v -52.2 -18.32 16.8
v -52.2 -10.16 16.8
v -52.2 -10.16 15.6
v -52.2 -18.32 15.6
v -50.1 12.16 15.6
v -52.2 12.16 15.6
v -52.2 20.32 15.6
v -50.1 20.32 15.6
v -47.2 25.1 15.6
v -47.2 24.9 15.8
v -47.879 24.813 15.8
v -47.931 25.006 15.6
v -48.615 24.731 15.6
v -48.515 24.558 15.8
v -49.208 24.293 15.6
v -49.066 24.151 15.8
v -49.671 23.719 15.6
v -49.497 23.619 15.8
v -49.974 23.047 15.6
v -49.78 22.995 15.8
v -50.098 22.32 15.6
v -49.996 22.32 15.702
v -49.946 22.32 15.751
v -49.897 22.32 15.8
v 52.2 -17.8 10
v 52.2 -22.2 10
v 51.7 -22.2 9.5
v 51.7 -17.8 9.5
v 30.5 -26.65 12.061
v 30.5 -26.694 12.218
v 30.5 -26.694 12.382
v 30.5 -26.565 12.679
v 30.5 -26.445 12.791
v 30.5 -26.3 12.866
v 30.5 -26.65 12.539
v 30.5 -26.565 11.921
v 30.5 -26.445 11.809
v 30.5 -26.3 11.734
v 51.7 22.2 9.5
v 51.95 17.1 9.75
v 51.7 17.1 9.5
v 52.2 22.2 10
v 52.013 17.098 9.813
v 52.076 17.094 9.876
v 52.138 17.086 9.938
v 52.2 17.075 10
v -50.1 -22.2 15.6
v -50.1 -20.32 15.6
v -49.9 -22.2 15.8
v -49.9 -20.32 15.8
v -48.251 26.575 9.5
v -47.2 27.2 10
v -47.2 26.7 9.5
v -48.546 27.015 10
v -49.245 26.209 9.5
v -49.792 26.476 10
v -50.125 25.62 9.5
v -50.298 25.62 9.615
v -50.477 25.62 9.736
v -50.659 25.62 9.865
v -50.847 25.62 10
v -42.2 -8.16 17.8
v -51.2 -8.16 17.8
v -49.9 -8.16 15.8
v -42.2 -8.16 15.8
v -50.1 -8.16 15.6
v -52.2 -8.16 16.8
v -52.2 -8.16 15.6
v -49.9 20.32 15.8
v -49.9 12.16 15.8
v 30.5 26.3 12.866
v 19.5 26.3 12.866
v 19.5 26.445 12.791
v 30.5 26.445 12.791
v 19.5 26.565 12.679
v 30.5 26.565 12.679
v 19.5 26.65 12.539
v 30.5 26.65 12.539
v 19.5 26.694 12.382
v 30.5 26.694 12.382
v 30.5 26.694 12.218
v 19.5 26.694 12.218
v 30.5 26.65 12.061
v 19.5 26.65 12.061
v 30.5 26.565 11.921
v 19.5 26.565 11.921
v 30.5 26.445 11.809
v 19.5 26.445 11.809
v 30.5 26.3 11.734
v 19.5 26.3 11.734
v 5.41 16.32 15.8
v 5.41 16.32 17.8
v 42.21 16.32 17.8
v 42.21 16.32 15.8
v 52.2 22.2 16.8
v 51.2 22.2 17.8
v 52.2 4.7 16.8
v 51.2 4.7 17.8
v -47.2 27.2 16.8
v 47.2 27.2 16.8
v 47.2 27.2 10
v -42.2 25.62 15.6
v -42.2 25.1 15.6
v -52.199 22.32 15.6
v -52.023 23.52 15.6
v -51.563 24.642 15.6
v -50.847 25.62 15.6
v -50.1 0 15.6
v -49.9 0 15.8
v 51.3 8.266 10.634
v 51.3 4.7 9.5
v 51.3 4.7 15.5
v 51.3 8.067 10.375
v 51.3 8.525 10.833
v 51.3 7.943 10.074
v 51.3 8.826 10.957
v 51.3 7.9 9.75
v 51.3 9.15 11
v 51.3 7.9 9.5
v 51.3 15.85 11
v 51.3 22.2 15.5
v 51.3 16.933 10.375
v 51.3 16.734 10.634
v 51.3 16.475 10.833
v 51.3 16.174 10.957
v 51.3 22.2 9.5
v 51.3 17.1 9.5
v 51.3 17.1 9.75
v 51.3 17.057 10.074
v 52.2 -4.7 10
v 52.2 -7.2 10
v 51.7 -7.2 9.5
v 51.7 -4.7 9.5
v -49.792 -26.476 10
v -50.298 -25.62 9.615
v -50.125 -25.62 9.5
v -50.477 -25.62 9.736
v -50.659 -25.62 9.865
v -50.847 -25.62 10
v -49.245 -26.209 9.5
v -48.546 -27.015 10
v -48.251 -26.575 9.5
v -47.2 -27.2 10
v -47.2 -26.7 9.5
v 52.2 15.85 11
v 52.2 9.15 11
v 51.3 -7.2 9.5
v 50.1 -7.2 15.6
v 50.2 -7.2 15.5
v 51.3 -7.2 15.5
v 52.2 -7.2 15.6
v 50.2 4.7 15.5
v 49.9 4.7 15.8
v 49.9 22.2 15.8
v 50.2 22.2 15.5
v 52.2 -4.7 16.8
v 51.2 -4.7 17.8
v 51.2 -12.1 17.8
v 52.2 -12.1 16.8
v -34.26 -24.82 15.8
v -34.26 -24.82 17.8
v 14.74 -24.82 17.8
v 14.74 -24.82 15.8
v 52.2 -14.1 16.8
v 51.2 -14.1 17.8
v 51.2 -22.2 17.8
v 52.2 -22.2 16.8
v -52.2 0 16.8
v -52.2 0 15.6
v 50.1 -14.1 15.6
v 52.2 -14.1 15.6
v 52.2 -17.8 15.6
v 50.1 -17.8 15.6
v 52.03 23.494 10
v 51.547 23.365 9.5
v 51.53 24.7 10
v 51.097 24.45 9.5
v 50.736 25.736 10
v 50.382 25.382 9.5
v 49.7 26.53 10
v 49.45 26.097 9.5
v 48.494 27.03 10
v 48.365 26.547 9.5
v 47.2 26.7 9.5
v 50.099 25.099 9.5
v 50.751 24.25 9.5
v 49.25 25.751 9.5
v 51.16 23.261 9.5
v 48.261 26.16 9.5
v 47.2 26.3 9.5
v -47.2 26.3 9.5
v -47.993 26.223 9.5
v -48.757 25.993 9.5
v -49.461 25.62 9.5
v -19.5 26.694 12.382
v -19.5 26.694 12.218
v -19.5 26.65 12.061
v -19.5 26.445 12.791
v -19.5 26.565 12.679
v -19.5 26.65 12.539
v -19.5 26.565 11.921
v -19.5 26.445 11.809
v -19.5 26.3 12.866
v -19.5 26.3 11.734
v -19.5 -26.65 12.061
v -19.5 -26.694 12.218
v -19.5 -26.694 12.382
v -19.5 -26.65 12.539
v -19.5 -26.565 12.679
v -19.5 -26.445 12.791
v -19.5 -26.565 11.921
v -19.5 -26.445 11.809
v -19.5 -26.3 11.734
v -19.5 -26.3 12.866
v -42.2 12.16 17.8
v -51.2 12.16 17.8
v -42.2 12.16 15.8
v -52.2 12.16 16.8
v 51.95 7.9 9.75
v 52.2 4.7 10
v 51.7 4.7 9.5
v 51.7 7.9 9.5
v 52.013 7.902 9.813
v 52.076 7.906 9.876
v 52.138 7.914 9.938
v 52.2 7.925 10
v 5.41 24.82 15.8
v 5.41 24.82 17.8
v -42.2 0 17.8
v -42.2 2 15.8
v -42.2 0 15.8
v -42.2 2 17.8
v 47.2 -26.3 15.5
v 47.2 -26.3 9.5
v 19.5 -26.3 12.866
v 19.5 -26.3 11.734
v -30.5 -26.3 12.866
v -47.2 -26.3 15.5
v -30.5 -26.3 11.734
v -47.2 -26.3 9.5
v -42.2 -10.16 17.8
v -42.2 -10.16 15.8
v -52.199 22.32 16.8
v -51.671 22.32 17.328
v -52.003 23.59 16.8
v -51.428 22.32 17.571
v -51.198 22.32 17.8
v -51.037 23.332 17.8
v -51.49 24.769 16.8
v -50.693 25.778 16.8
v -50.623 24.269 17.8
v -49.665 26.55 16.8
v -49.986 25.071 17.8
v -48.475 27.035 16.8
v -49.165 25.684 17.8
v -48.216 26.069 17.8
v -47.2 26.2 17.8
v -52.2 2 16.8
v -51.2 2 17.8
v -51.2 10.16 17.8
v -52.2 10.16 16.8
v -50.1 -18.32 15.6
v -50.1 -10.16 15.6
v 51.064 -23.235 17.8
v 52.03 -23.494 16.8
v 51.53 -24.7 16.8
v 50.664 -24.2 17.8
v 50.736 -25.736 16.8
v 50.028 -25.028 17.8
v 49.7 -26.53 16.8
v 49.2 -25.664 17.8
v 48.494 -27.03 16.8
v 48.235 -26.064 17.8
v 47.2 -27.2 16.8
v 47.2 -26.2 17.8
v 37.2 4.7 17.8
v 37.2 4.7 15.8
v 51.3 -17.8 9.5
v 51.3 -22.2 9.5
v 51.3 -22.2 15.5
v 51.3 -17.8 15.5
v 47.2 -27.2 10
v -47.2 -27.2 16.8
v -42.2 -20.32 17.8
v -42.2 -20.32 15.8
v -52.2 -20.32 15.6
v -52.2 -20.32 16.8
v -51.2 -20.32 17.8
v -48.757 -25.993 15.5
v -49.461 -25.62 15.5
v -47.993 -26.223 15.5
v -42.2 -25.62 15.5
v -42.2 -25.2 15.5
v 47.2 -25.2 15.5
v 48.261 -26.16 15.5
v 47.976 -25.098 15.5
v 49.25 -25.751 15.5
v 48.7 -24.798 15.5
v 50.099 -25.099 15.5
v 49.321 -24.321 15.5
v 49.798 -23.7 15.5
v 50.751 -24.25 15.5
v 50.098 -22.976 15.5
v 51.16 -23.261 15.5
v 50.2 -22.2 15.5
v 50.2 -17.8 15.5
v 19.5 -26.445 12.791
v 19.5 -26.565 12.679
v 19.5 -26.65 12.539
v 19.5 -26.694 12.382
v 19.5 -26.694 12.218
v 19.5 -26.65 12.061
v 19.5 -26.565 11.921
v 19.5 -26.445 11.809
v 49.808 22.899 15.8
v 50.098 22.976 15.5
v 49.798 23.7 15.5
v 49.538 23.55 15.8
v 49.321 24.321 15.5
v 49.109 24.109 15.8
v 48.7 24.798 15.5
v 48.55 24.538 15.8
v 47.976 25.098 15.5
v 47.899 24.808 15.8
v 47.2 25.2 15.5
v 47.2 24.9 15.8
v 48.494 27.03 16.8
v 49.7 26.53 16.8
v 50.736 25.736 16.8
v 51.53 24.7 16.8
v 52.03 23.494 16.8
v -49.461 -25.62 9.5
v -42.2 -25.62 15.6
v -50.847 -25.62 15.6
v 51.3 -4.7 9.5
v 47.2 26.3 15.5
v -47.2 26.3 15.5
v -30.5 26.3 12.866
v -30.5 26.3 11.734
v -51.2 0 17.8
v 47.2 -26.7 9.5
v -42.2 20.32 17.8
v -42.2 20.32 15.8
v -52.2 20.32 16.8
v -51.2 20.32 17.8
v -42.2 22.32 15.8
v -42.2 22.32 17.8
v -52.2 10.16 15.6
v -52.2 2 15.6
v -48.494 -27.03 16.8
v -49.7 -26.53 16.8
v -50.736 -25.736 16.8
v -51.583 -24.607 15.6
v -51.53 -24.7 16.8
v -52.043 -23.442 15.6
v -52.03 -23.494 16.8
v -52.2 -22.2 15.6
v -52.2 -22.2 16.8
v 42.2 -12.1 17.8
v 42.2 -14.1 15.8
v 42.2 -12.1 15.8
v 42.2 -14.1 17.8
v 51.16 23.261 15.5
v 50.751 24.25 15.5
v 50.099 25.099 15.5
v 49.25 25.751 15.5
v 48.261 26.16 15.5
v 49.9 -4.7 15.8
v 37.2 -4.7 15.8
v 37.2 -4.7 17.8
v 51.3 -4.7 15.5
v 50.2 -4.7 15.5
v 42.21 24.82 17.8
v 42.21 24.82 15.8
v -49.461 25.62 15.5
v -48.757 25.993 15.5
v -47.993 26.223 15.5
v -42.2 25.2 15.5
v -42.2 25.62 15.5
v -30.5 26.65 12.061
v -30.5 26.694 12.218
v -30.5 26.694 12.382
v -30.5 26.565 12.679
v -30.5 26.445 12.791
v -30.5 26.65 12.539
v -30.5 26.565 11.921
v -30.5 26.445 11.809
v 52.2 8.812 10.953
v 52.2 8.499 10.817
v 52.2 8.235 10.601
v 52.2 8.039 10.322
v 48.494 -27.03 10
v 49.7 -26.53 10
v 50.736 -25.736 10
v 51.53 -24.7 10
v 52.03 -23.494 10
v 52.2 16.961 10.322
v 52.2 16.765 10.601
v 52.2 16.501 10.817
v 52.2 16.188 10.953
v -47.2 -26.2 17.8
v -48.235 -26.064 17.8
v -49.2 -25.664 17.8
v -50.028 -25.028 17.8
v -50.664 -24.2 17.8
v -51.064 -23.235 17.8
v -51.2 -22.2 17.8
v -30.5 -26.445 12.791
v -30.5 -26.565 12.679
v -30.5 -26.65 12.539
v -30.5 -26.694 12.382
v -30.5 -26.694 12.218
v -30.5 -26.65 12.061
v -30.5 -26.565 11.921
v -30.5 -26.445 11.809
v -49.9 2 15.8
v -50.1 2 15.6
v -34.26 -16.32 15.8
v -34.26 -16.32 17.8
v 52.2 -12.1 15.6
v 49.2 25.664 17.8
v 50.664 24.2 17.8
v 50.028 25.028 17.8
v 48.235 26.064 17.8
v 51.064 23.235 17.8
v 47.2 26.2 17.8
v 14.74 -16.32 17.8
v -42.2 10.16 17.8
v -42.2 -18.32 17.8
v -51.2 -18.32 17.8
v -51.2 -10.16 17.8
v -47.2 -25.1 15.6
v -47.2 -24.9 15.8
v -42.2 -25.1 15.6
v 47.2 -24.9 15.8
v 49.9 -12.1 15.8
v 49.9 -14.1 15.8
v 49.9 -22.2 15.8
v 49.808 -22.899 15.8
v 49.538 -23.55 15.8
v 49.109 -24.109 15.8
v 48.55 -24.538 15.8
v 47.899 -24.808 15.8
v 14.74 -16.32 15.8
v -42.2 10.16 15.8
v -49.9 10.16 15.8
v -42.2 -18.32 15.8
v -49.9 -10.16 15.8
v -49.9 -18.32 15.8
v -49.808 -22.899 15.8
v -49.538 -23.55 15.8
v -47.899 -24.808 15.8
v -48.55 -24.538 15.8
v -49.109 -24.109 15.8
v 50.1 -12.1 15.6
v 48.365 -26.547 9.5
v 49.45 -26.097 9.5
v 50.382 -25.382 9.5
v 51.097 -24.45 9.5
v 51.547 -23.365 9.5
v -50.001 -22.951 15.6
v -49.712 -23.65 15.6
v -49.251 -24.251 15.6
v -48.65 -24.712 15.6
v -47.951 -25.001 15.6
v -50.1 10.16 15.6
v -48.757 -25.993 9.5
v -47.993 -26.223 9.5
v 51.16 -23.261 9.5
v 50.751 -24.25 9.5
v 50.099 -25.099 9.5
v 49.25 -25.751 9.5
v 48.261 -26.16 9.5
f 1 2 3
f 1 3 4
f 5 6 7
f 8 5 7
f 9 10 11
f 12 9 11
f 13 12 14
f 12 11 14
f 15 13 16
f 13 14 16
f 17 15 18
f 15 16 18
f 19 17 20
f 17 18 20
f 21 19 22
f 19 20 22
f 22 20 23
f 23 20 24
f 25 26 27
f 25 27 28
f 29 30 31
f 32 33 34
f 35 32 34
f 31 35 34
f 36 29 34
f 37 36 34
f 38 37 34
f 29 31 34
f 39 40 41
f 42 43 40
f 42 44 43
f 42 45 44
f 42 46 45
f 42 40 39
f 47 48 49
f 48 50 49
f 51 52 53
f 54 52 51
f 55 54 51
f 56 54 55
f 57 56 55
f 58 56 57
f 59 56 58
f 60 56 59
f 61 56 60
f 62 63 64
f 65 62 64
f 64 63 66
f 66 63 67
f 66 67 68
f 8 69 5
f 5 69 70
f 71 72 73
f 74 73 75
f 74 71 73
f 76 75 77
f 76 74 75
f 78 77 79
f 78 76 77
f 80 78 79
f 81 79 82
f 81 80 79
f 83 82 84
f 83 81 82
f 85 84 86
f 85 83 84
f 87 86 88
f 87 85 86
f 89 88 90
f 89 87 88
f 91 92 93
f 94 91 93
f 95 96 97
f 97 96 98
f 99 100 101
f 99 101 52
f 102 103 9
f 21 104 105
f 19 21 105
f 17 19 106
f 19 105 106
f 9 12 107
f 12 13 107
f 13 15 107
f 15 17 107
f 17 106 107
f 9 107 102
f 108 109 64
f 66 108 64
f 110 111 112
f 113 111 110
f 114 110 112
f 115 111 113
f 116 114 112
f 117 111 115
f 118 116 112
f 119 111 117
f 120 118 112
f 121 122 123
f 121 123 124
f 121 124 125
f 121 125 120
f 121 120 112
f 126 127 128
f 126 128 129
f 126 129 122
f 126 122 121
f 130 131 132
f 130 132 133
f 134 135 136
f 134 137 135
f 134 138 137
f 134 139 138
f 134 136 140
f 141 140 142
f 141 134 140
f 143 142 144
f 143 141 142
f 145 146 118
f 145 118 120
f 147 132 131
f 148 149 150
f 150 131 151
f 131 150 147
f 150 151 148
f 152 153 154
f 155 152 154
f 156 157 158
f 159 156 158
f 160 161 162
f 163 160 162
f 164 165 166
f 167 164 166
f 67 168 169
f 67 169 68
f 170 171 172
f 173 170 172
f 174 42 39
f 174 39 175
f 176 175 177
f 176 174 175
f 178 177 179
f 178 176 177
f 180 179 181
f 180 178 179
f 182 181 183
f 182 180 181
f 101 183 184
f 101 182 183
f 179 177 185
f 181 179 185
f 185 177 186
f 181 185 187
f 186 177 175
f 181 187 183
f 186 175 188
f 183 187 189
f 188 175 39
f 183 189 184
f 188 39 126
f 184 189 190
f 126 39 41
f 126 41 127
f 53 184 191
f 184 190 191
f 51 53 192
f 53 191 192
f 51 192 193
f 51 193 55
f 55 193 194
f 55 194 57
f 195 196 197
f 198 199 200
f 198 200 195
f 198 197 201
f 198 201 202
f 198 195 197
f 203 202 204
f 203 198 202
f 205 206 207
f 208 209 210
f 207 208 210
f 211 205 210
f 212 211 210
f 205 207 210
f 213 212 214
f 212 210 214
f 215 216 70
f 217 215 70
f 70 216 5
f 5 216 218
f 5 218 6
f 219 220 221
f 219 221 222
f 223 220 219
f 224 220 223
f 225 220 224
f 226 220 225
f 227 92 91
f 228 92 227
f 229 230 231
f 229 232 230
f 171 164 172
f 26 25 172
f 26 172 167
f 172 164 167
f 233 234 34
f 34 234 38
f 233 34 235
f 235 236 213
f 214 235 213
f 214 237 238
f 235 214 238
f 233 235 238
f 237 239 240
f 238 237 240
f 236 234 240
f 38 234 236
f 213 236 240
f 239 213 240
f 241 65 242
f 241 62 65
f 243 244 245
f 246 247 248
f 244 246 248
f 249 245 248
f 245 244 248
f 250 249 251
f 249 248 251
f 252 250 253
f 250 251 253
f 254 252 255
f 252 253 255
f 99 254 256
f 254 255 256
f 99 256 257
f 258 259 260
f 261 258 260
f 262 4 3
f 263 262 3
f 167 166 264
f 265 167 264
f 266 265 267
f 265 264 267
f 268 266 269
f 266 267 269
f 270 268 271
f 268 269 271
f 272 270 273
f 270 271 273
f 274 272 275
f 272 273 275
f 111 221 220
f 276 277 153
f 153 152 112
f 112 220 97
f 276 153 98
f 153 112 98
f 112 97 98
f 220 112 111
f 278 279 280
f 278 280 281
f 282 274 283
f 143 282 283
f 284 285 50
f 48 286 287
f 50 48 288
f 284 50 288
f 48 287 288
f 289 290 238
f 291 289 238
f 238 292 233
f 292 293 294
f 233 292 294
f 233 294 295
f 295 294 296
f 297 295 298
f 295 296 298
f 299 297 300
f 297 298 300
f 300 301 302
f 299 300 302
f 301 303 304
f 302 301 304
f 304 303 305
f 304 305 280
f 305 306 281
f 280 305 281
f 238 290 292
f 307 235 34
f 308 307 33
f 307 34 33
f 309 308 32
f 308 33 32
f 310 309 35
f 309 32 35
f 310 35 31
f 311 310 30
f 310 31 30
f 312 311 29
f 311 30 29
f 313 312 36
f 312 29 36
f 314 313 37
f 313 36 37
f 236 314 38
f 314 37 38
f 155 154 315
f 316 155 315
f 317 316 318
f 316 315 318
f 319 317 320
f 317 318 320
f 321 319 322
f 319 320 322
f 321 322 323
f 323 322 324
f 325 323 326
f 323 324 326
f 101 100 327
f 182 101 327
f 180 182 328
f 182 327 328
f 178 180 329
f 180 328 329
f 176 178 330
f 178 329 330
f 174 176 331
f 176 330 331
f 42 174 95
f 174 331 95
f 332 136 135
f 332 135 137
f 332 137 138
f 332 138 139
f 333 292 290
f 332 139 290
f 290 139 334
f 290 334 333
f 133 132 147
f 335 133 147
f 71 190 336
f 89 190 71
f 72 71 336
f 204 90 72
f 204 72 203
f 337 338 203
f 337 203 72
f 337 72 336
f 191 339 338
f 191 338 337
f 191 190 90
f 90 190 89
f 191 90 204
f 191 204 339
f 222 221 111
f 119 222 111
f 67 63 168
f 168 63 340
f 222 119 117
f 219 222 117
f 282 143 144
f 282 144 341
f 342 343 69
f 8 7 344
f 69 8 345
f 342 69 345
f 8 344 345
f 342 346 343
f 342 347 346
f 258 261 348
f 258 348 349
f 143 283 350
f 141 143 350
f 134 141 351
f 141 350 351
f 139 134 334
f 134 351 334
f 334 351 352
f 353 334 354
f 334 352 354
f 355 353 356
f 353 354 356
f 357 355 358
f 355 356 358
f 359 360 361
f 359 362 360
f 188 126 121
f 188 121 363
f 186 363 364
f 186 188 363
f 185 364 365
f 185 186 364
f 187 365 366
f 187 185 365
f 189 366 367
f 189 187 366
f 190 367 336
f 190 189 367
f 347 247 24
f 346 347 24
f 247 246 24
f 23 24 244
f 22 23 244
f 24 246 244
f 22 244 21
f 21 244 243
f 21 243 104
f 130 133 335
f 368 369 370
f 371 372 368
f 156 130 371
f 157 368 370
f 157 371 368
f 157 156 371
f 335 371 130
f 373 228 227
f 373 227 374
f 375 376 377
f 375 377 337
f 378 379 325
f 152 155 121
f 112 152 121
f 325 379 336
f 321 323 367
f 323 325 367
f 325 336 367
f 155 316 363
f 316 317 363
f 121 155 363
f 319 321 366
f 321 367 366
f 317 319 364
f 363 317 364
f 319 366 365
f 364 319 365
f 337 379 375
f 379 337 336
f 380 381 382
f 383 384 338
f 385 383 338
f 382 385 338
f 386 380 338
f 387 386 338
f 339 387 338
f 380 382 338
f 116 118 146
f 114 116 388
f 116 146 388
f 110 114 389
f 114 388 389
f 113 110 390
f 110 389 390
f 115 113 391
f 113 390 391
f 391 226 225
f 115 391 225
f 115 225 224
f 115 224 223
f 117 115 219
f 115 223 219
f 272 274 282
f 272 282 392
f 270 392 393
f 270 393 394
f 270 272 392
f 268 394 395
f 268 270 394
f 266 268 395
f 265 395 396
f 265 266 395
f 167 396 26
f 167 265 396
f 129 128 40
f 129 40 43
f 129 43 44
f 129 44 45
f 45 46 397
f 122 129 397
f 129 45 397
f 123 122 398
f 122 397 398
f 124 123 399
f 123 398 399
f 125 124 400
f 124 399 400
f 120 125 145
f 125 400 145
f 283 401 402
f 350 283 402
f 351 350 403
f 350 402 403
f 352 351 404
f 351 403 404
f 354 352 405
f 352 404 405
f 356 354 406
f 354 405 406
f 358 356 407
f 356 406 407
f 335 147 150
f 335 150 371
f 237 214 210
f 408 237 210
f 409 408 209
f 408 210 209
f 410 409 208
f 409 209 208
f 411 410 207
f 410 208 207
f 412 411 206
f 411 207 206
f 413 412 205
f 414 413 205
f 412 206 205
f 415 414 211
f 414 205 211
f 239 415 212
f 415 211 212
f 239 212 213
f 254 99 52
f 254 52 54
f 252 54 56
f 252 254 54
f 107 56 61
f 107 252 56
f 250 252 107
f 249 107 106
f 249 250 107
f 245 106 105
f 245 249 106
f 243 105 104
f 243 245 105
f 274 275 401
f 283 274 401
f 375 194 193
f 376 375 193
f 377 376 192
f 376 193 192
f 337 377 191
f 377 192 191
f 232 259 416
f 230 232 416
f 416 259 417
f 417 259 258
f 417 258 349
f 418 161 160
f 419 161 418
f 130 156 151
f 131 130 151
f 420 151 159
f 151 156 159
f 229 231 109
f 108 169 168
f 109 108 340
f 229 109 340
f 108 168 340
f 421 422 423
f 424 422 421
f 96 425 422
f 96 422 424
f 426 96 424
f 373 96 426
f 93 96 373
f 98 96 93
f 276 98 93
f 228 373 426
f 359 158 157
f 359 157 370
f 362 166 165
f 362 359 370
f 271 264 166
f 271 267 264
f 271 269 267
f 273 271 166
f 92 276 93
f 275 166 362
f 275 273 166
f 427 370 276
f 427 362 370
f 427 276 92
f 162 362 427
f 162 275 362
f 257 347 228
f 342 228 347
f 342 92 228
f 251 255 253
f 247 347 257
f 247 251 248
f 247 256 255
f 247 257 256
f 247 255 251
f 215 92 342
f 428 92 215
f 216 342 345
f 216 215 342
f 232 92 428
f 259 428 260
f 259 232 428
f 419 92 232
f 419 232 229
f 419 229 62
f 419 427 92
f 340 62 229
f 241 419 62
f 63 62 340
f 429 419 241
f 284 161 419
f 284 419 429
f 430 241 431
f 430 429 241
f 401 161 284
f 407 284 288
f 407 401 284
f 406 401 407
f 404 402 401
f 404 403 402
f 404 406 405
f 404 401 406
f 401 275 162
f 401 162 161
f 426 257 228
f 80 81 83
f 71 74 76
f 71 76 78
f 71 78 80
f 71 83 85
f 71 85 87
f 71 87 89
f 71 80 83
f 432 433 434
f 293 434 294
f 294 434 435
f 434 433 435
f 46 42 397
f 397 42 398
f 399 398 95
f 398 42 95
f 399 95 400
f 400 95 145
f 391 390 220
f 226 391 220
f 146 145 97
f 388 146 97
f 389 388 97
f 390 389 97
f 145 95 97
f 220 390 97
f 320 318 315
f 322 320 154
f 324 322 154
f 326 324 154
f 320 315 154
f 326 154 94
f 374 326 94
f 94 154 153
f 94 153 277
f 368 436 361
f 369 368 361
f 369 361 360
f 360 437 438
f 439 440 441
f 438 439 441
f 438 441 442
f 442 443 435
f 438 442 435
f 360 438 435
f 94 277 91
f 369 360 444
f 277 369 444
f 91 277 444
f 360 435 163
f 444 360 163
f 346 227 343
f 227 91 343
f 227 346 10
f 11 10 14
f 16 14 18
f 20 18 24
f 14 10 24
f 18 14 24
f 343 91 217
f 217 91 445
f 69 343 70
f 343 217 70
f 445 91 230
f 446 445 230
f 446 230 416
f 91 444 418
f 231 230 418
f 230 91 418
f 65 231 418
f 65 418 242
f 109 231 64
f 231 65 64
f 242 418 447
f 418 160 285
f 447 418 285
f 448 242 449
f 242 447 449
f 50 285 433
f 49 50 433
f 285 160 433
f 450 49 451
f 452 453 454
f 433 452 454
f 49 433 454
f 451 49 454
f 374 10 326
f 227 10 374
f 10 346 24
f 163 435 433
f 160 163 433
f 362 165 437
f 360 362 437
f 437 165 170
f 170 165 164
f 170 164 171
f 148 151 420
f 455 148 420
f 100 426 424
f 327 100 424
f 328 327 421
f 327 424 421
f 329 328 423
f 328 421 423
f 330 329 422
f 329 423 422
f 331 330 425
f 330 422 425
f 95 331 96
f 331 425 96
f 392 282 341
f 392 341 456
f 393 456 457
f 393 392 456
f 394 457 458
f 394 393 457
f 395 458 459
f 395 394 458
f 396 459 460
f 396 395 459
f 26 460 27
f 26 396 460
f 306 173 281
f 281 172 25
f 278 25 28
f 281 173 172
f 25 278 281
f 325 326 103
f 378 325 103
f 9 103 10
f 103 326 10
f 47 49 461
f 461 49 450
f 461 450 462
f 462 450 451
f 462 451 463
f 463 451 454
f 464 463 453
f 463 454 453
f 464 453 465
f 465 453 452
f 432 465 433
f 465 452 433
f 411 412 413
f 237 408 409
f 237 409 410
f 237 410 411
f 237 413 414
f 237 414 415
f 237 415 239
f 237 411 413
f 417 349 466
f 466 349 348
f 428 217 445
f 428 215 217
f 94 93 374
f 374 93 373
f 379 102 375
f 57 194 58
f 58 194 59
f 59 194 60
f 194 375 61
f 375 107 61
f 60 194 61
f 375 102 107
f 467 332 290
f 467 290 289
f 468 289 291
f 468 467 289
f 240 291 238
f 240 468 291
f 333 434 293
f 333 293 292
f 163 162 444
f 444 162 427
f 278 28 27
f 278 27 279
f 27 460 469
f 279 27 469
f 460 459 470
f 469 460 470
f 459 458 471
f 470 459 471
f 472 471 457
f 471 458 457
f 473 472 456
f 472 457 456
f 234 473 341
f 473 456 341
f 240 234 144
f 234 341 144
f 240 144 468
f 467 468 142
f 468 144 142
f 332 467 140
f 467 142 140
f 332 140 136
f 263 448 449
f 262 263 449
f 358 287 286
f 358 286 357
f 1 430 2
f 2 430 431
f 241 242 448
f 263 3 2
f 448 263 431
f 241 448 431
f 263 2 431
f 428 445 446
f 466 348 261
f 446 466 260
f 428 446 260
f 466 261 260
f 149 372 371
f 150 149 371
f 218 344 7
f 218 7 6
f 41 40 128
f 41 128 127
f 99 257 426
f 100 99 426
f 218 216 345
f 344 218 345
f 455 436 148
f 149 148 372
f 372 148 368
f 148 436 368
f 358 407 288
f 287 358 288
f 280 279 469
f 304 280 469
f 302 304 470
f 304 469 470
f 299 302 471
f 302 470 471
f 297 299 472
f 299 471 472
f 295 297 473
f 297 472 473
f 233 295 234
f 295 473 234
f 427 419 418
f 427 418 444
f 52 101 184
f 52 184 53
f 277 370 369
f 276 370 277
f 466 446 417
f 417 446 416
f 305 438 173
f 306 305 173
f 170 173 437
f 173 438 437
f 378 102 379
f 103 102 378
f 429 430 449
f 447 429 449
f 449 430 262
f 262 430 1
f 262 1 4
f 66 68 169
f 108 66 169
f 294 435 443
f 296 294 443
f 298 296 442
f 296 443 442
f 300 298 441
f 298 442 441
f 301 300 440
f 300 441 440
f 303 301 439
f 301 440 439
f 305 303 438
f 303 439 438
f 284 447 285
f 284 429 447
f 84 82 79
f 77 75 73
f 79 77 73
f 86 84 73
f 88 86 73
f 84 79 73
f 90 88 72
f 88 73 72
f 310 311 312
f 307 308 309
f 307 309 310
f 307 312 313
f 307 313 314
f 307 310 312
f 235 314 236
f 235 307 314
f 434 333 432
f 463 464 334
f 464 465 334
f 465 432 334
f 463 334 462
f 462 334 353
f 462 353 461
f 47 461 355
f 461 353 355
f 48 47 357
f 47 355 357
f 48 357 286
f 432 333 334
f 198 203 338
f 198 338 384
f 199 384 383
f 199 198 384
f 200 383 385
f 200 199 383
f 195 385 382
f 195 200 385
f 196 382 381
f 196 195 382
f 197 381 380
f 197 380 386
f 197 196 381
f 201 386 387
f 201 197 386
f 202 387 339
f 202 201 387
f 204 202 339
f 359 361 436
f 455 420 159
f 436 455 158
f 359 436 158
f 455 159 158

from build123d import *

# Parameters (mm, degrees)
PAD006_DEPTH               = 8.3
POCKET_DEPTH               = 6
PAD006_MIRRORED010_2_DEPTH = 8.3
POCKET_MIRRORED010_2_DEPTH = 6
PAD007_DEPTH               = 2
PAD007_MIRRORED014_2_DEPTH = 2
POCKET003_DEPTH            = 30.5
PAD009_DEPTH               = 19.5
PAD009_FACE36_W            = 39
PAD009_FACE36_H            = 1.2
POCKET004_DEPTH            = 0.2
CHAMFER005_SIZE            = 0.5
CHAMFER006_SIZE            = 1
CHAMFER007_SIZE            = 0.2999
SKETCH030_W                = 49
SKETCH030_H                = 8.5
SKETCH030_W_2              = 36.8
POCKET010_DEPTH            = 5
POCKET011_DEPTH            = 10
SKETCH018_W                = 9.4
SKETCH018_H                = 50
POCKET012_DEPTH            = 15
POCKET013_DEPTH            = 5
POCKET014_DEPTH            = 10
POCKET015_DEPTH            = 10
POCKET016_DEPTH            = 10
POCKET017_DEPTH            = 10
POCKET018_DEPTH            = 10


with BuildPart() as part:
    # Sketch008 (on DatumPlane) → Pad006 (new body)
    with BuildSketch(Plane.XY.offset(17.8)):
        with BuildLine():
            ThreePointArc((-47.2, 27.2), (-50.735534, 25.735534), (-52.2, 22.2))
            Line((-52.2, 0), (-52.2, 22.2))
            Line((-50.2, 0), (-52.2, 0))
            Line((-50.2, 22.2), (-50.2, 0))
            ThreePointArc((-47.2, 25.2), (-49.32132, 24.32132), (-50.2, 22.2))
            Line((0, 25.2), (-47.2, 25.2))
            Line((0, 27.2), (0, 25.2))
            Line((-47.2, 27.2), (0, 27.2))
        make_face()
    pad006 = extrude(amount=-PAD006_DEPTH)

    # Sketch009 (on Face10 of Pad006) → Pocket (cut)
    with BuildSketch(Plane(origin=(0, 0, 9.5), x_dir=(1, 0, 0), z_dir=(0, 0, -1))):
        with BuildLine():
            ThreePointArc((-50.2, -22.2), (-49.32132, -24.32132), (-47.2, -25.2))
            Line((-47.2, -25.2), (0, -25.2))
            Line((0, -25.2), (0, -26.3))
            Line((0, -26.3), (-47.2, -26.3))
            ThreePointArc((-51.3, -22.2), (-50.099138, -25.099138), (-47.2, -26.3))
            Line((-51.3, 0), (-51.3, -22.2))
            Line((-50.2, 0), (-51.3, 0))
            Line((-50.2, -22.2), (-50.2, 0))
        make_face()
    pocket = extrude(amount=-POCKET_DEPTH, mode=Mode.SUBTRACT)

    # Sketch008 Mirrored010 2 → Pad006 Mirrored010 2 (add)
    with BuildSketch(Plane(origin=(0, 0, 17.8), x_dir=(-1, 0, 0), z_dir=(0, 0, -1))):
        with BuildLine():
            ThreePointArc((-47.2, 27.2), (-50.735534, 25.735534), (-52.2, 22.2))
            Line((-52.2, 0), (-52.2, 22.2))
            Line((-50.2, 0), (-52.2, 0))
            Line((-50.2, 22.2), (-50.2, 0))
            ThreePointArc((-47.2, 25.2), (-49.32132, 24.32132), (-50.2, 22.2))
            Line((0, 25.2), (-47.2, 25.2))
            Line((0, 27.2), (0, 25.2))
            Line((-47.2, 27.2), (0, 27.2))
        make_face()
    pad006_mirrored010_2 = extrude(amount=PAD006_MIRRORED010_2_DEPTH)

    # Sketch009 Mirrored010 2 → Pocket Mirrored010 2 (cut)
    with BuildSketch(Plane(origin=(0, 0, 9.5), x_dir=(-1, 0, 0), z_dir=(0, 0, 1))):
        with BuildLine():
            ThreePointArc((-50.2, -22.2), (-49.32132, -24.32132), (-47.2, -25.2))
            Line((-47.2, -25.2), (0, -25.2))
            Line((0, -25.2), (0, -26.3))
            Line((0, -26.3), (-47.2, -26.3))
            ThreePointArc((-51.3, -22.2), (-50.099138, -25.099138), (-47.2, -26.3))
            Line((-51.3, 0), (-51.3, -22.2))
            Line((-50.2, 0), (-51.3, 0))
            Line((-50.2, -22.2), (-50.2, 0))
        make_face()
    pocket_mirrored010_2 = extrude(amount=POCKET_MIRRORED010_2_DEPTH, mode=Mode.SUBTRACT)

    # Mirrored011: Pad006, Pocket, Pad006 Mirrored010 2, Pocket Mirrored010 2 across Sketch008 H_Axis
    add(pad006.mirror(Plane(origin=(0, 0, 17.8), x_dir=(0, 0, 1), z_dir=(0, 1, 0))))
    add(pocket.mirror(Plane(origin=(0, 0, 17.8), x_dir=(0, 0, 1), z_dir=(0, 1, 0))), mode=Mode.SUBTRACT)
    add(pad006_mirrored010_2.mirror(Plane(origin=(0, 0, 17.8), x_dir=(0, 0, 1), z_dir=(0, 1, 0))))
    add(pocket_mirrored010_2.mirror(Plane(origin=(0, 0, 17.8), x_dir=(0, 0, 1), z_dir=(0, 1, 0))), mode=Mode.SUBTRACT)

    # Sketch011 (on DatumPlane) → Pad007 (join)
    with BuildSketch(Plane.XY.offset(17.8)):
        with BuildLine():
            ThreePointArc((-47.2, 25.2), (-49.32132, 24.32132), (-50.2, 22.2))
            Line((-50.2, 22.2), (-50.2, 0))
            Line((-50.2, 0), (0, 0))
            Line((0, 0), (0, 25.2))
            Line((0, 25.2), (-47.2, 25.2))
        make_face()
    pad007 = extrude(amount=-PAD007_DEPTH)

    # Sketch011 Mirrored014 2 → Pad007 Mirrored014 2 (add)
    with BuildSketch(Plane(origin=(0, 0, 17.8), x_dir=(-1, 0, 0), z_dir=(0, 0, -1))):
        with BuildLine():
            ThreePointArc((-47.2, 25.2), (-49.32132, 24.32132), (-50.2, 22.2))
            Line((-50.2, 22.2), (-50.2, 0))
            Line((-50.2, 0), (0, 0))
            Line((0, 0), (0, 25.2))
            Line((0, 25.2), (-47.2, 25.2))
        make_face()
    pad007_mirrored014_2 = extrude(amount=PAD007_MIRRORED014_2_DEPTH)

    # Mirrored015: Pad007, Pad007 Mirrored014 2 across Sketch011 H_Axis
    add(pad007.mirror(Plane(origin=(0, 0, 17.8), x_dir=(0, 0, 1), z_dir=(0, 1, 0))))
    add(pad007_mirrored014_2.mirror(Plane(origin=(0, 0, 17.8), x_dir=(0, 0, 1), z_dir=(0, 1, 0))))

    # Sketch013 → Pocket003 (cut, symmetric)
    with BuildSketch(Plane.YZ):
        with BuildLine():
            ThreePointArc((-26.1, 12.9), (-26.7, 12.3), (-26.1, 11.7))
            Line((-26.1, 12.9), (-26.1, 11.7))
        make_face()
    pocket003 = extrude(amount=POCKET003_DEPTH, both=True, mode=Mode.SUBTRACT)

    # Sketch013 → Pad009 (join, symmetric)
    with BuildSketch(Plane.YZ):
        with BuildLine():
            ThreePointArc((-26.1, 12.9), (-26.7, 12.3), (-26.1, 11.7))
            Line((-26.1, 12.9), (-26.1, 11.7))
        make_face()
    pad009 = extrude(amount=PAD009_DEPTH, both=True)

    # Pad009 Face36 → Pocket004 (cut)
    with BuildSketch(Plane(origin=(0, -26.1, 12.3), x_dir=(1, 0, 0), z_dir=(0, 1, 0))):
        Rectangle(PAD009_FACE36_W, PAD009_FACE36_H)
    pocket004 = extrude(amount=-POCKET004_DEPTH, mode=Mode.SUBTRACT)

    # Mirrored017: Pocket003, Pad009, Pocket004 across Sketch013 V_Axis
    add(pocket003.mirror(Plane(origin=(0, 0, 0), x_dir=(1, 0, 0), z_dir=(0, 1, 0))), mode=Mode.SUBTRACT)
    add(pad009.mirror(Plane(origin=(0, 0, 0), x_dir=(1, 0, 0), z_dir=(0, 1, 0))))
    add(pocket004.mirror(Plane(origin=(0, 0, 0), x_dir=(1, 0, 0), z_dir=(0, 1, 0))), mode=Mode.SUBTRACT)

    # Chamfer005
    chamfer005_edges = [part.edges().sort_by_distance(p)[0] for p in [
        (0, -27.2, 9.5),
    ]]
    chamfer(chamfer005_edges, length=CHAMFER005_SIZE)

    # Chamfer006
    chamfer006_edges = [part.edges().sort_by_distance(p)[0] for p in [
        (0, -27.2, 17.8),
    ]]
    chamfer(chamfer006_edges, length=CHAMFER006_SIZE)

    # Chamfer007
    chamfer007_edges = [part.edges().sort_by_distance(p)[0] for p in [
        (50.2, 0, 15.8),
    ]]
    chamfer(chamfer007_edges, length=CHAMFER007_SIZE)

    # Sketch030 (on DatumPlane) → Pocket010 (cut)
    with BuildSketch(Plane.XY.offset(17.8)):
        with Locations((-9.76, -20.57)):
            Rectangle(SKETCH030_W, SKETCH030_H)
        with Locations((23.81, 20.57)):
            Rectangle(SKETCH030_W_2, SKETCH030_H)
    extrude(amount=-POCKET010_DEPTH, mode=Mode.SUBTRACT)

    # Sketch017 (on DatumPlane) → Pocket011 (cut)
    with BuildSketch(Plane.YZ.offset(52.2)):
        Polygon((-7.2, 7.6), (-7.2, 15.6), (-12.1, 15.6), (-12.1, 18.1), (-14.1, 18.1), (-14.1, 15.6), (-17.8, 15.6), (-17.8, 7.6), (-17.8, 2.6), (-7.2, 2.6), align=None)
    extrude(amount=-POCKET011_DEPTH, mode=Mode.SUBTRACT)

    # Sketch018 (on DatumPlane) → Pocket012 (cut)
    with BuildSketch(Plane.YZ.offset(52.2)):
        with Locations((0, -6)):
            Rectangle(SKETCH018_W, SKETCH018_H)
    extrude(amount=-POCKET012_DEPTH, mode=Mode.SUBTRACT)

    # Sketch019 (on DatumPlane) → Pocket013 (cut)
    with BuildSketch(Plane.YZ.offset(52.2)):
        with BuildLine():
            Line((7.9, -40.25), (7.9, 9.75))
            ThreePointArc((9.15, 11), (8.266117, 10.633883), (7.9, 9.75))
            Line((9.15, 11), (15.85, 11))
            ThreePointArc((17.1, 9.75), (16.733883, 10.633883), (15.85, 11))
            Line((17.1, 9.75), (17.1, -40.25))
            Line((7.9, -40.25), (17.1, -40.25))
        make_face()
    extrude(amount=-POCKET013_DEPTH, mode=Mode.SUBTRACT)

    # Sketch026 (on DatumPlane) → Pocket014 (cut)
    with BuildSketch(Plane(origin=(-52.2, 0, 0), x_dir=(0, -1, 0), z_dir=(-1, 0, 0))):
        Polygon((-15.02, 7.6), (-15.02, 15.6), (-20.32, 15.6), (-20.32, 18.1), (-22.32, 18.1), (-22.32, 15.6), (-25.62, 15.6), (-25.62, 7.6), (-25.62, -42.4), (-15.02, -42.4), align=None)
    extrude(amount=-POCKET014_DEPTH, mode=Mode.SUBTRACT)

    # Sketch027 (on DatumPlane) → Pocket015 (cut)
    with BuildSketch(Plane(origin=(-52.2, 0, 0), x_dir=(0, -1, 0), z_dir=(-1, 0, 0))):
        Polygon((-4.86, 7.6), (-4.86, 15.6), (-10.16, 15.6), (-10.16, 18.1), (-12.16, 18.1), (-12.16, 15.6), (-15.46, 15.6), (-15.46, 7.6), (-15.46, -42.4), (-4.86, -42.4), align=None)
    extrude(amount=-POCKET015_DEPTH, mode=Mode.SUBTRACT)

    # Sketch025 (on DatumPlane) → Pocket016 (cut)
    with BuildSketch(Plane(origin=(-52.2, 0, 0), x_dir=(0, -1, 0), z_dir=(-1, 0, 0))):
        Polygon((5.3, 7.6), (5.3, 15.6), (0, 15.6), (0, 18.1), (-2, 18.1), (-2, 15.6), (-5.3, 15.6), (-5.3, 7.6), (-5.3, -42.4), (5.3, -42.4), align=None)
    extrude(amount=-POCKET016_DEPTH, mode=Mode.SUBTRACT)

    # Sketch028 (on DatumPlane) → Pocket017 (cut)
    with BuildSketch(Plane(origin=(-52.2, 0, 0), x_dir=(0, -1, 0), z_dir=(-1, 0, 0))):
        Polygon((15.46, 7.6), (15.46, 15.6), (10.16, 15.6), (10.16, 18.1), (8.16, 18.1), (8.16, 15.6), (4.86, 15.6), (4.86, 7.6), (4.86, -42.4), (15.46, -42.4), align=None)
    extrude(amount=-POCKET017_DEPTH, mode=Mode.SUBTRACT)

    # Sketch029 (on DatumPlane) → Pocket018 (cut)
    with BuildSketch(Plane(origin=(-52.2, 0, 0), x_dir=(0, -1, 0), z_dir=(-1, 0, 0))):
        Polygon((25.62, 7.6), (25.62, 15.6), (20.32, 15.6), (20.32, 18.1), (18.32, 18.1), (18.32, 15.6), (15.02, 15.6), (15.02, 7.6), (15.02, -42.4), (25.62, -42.4), align=None)
    extrude(amount=-POCKET018_DEPTH, mode=Mode.SUBTRACT)


solid = part.part
